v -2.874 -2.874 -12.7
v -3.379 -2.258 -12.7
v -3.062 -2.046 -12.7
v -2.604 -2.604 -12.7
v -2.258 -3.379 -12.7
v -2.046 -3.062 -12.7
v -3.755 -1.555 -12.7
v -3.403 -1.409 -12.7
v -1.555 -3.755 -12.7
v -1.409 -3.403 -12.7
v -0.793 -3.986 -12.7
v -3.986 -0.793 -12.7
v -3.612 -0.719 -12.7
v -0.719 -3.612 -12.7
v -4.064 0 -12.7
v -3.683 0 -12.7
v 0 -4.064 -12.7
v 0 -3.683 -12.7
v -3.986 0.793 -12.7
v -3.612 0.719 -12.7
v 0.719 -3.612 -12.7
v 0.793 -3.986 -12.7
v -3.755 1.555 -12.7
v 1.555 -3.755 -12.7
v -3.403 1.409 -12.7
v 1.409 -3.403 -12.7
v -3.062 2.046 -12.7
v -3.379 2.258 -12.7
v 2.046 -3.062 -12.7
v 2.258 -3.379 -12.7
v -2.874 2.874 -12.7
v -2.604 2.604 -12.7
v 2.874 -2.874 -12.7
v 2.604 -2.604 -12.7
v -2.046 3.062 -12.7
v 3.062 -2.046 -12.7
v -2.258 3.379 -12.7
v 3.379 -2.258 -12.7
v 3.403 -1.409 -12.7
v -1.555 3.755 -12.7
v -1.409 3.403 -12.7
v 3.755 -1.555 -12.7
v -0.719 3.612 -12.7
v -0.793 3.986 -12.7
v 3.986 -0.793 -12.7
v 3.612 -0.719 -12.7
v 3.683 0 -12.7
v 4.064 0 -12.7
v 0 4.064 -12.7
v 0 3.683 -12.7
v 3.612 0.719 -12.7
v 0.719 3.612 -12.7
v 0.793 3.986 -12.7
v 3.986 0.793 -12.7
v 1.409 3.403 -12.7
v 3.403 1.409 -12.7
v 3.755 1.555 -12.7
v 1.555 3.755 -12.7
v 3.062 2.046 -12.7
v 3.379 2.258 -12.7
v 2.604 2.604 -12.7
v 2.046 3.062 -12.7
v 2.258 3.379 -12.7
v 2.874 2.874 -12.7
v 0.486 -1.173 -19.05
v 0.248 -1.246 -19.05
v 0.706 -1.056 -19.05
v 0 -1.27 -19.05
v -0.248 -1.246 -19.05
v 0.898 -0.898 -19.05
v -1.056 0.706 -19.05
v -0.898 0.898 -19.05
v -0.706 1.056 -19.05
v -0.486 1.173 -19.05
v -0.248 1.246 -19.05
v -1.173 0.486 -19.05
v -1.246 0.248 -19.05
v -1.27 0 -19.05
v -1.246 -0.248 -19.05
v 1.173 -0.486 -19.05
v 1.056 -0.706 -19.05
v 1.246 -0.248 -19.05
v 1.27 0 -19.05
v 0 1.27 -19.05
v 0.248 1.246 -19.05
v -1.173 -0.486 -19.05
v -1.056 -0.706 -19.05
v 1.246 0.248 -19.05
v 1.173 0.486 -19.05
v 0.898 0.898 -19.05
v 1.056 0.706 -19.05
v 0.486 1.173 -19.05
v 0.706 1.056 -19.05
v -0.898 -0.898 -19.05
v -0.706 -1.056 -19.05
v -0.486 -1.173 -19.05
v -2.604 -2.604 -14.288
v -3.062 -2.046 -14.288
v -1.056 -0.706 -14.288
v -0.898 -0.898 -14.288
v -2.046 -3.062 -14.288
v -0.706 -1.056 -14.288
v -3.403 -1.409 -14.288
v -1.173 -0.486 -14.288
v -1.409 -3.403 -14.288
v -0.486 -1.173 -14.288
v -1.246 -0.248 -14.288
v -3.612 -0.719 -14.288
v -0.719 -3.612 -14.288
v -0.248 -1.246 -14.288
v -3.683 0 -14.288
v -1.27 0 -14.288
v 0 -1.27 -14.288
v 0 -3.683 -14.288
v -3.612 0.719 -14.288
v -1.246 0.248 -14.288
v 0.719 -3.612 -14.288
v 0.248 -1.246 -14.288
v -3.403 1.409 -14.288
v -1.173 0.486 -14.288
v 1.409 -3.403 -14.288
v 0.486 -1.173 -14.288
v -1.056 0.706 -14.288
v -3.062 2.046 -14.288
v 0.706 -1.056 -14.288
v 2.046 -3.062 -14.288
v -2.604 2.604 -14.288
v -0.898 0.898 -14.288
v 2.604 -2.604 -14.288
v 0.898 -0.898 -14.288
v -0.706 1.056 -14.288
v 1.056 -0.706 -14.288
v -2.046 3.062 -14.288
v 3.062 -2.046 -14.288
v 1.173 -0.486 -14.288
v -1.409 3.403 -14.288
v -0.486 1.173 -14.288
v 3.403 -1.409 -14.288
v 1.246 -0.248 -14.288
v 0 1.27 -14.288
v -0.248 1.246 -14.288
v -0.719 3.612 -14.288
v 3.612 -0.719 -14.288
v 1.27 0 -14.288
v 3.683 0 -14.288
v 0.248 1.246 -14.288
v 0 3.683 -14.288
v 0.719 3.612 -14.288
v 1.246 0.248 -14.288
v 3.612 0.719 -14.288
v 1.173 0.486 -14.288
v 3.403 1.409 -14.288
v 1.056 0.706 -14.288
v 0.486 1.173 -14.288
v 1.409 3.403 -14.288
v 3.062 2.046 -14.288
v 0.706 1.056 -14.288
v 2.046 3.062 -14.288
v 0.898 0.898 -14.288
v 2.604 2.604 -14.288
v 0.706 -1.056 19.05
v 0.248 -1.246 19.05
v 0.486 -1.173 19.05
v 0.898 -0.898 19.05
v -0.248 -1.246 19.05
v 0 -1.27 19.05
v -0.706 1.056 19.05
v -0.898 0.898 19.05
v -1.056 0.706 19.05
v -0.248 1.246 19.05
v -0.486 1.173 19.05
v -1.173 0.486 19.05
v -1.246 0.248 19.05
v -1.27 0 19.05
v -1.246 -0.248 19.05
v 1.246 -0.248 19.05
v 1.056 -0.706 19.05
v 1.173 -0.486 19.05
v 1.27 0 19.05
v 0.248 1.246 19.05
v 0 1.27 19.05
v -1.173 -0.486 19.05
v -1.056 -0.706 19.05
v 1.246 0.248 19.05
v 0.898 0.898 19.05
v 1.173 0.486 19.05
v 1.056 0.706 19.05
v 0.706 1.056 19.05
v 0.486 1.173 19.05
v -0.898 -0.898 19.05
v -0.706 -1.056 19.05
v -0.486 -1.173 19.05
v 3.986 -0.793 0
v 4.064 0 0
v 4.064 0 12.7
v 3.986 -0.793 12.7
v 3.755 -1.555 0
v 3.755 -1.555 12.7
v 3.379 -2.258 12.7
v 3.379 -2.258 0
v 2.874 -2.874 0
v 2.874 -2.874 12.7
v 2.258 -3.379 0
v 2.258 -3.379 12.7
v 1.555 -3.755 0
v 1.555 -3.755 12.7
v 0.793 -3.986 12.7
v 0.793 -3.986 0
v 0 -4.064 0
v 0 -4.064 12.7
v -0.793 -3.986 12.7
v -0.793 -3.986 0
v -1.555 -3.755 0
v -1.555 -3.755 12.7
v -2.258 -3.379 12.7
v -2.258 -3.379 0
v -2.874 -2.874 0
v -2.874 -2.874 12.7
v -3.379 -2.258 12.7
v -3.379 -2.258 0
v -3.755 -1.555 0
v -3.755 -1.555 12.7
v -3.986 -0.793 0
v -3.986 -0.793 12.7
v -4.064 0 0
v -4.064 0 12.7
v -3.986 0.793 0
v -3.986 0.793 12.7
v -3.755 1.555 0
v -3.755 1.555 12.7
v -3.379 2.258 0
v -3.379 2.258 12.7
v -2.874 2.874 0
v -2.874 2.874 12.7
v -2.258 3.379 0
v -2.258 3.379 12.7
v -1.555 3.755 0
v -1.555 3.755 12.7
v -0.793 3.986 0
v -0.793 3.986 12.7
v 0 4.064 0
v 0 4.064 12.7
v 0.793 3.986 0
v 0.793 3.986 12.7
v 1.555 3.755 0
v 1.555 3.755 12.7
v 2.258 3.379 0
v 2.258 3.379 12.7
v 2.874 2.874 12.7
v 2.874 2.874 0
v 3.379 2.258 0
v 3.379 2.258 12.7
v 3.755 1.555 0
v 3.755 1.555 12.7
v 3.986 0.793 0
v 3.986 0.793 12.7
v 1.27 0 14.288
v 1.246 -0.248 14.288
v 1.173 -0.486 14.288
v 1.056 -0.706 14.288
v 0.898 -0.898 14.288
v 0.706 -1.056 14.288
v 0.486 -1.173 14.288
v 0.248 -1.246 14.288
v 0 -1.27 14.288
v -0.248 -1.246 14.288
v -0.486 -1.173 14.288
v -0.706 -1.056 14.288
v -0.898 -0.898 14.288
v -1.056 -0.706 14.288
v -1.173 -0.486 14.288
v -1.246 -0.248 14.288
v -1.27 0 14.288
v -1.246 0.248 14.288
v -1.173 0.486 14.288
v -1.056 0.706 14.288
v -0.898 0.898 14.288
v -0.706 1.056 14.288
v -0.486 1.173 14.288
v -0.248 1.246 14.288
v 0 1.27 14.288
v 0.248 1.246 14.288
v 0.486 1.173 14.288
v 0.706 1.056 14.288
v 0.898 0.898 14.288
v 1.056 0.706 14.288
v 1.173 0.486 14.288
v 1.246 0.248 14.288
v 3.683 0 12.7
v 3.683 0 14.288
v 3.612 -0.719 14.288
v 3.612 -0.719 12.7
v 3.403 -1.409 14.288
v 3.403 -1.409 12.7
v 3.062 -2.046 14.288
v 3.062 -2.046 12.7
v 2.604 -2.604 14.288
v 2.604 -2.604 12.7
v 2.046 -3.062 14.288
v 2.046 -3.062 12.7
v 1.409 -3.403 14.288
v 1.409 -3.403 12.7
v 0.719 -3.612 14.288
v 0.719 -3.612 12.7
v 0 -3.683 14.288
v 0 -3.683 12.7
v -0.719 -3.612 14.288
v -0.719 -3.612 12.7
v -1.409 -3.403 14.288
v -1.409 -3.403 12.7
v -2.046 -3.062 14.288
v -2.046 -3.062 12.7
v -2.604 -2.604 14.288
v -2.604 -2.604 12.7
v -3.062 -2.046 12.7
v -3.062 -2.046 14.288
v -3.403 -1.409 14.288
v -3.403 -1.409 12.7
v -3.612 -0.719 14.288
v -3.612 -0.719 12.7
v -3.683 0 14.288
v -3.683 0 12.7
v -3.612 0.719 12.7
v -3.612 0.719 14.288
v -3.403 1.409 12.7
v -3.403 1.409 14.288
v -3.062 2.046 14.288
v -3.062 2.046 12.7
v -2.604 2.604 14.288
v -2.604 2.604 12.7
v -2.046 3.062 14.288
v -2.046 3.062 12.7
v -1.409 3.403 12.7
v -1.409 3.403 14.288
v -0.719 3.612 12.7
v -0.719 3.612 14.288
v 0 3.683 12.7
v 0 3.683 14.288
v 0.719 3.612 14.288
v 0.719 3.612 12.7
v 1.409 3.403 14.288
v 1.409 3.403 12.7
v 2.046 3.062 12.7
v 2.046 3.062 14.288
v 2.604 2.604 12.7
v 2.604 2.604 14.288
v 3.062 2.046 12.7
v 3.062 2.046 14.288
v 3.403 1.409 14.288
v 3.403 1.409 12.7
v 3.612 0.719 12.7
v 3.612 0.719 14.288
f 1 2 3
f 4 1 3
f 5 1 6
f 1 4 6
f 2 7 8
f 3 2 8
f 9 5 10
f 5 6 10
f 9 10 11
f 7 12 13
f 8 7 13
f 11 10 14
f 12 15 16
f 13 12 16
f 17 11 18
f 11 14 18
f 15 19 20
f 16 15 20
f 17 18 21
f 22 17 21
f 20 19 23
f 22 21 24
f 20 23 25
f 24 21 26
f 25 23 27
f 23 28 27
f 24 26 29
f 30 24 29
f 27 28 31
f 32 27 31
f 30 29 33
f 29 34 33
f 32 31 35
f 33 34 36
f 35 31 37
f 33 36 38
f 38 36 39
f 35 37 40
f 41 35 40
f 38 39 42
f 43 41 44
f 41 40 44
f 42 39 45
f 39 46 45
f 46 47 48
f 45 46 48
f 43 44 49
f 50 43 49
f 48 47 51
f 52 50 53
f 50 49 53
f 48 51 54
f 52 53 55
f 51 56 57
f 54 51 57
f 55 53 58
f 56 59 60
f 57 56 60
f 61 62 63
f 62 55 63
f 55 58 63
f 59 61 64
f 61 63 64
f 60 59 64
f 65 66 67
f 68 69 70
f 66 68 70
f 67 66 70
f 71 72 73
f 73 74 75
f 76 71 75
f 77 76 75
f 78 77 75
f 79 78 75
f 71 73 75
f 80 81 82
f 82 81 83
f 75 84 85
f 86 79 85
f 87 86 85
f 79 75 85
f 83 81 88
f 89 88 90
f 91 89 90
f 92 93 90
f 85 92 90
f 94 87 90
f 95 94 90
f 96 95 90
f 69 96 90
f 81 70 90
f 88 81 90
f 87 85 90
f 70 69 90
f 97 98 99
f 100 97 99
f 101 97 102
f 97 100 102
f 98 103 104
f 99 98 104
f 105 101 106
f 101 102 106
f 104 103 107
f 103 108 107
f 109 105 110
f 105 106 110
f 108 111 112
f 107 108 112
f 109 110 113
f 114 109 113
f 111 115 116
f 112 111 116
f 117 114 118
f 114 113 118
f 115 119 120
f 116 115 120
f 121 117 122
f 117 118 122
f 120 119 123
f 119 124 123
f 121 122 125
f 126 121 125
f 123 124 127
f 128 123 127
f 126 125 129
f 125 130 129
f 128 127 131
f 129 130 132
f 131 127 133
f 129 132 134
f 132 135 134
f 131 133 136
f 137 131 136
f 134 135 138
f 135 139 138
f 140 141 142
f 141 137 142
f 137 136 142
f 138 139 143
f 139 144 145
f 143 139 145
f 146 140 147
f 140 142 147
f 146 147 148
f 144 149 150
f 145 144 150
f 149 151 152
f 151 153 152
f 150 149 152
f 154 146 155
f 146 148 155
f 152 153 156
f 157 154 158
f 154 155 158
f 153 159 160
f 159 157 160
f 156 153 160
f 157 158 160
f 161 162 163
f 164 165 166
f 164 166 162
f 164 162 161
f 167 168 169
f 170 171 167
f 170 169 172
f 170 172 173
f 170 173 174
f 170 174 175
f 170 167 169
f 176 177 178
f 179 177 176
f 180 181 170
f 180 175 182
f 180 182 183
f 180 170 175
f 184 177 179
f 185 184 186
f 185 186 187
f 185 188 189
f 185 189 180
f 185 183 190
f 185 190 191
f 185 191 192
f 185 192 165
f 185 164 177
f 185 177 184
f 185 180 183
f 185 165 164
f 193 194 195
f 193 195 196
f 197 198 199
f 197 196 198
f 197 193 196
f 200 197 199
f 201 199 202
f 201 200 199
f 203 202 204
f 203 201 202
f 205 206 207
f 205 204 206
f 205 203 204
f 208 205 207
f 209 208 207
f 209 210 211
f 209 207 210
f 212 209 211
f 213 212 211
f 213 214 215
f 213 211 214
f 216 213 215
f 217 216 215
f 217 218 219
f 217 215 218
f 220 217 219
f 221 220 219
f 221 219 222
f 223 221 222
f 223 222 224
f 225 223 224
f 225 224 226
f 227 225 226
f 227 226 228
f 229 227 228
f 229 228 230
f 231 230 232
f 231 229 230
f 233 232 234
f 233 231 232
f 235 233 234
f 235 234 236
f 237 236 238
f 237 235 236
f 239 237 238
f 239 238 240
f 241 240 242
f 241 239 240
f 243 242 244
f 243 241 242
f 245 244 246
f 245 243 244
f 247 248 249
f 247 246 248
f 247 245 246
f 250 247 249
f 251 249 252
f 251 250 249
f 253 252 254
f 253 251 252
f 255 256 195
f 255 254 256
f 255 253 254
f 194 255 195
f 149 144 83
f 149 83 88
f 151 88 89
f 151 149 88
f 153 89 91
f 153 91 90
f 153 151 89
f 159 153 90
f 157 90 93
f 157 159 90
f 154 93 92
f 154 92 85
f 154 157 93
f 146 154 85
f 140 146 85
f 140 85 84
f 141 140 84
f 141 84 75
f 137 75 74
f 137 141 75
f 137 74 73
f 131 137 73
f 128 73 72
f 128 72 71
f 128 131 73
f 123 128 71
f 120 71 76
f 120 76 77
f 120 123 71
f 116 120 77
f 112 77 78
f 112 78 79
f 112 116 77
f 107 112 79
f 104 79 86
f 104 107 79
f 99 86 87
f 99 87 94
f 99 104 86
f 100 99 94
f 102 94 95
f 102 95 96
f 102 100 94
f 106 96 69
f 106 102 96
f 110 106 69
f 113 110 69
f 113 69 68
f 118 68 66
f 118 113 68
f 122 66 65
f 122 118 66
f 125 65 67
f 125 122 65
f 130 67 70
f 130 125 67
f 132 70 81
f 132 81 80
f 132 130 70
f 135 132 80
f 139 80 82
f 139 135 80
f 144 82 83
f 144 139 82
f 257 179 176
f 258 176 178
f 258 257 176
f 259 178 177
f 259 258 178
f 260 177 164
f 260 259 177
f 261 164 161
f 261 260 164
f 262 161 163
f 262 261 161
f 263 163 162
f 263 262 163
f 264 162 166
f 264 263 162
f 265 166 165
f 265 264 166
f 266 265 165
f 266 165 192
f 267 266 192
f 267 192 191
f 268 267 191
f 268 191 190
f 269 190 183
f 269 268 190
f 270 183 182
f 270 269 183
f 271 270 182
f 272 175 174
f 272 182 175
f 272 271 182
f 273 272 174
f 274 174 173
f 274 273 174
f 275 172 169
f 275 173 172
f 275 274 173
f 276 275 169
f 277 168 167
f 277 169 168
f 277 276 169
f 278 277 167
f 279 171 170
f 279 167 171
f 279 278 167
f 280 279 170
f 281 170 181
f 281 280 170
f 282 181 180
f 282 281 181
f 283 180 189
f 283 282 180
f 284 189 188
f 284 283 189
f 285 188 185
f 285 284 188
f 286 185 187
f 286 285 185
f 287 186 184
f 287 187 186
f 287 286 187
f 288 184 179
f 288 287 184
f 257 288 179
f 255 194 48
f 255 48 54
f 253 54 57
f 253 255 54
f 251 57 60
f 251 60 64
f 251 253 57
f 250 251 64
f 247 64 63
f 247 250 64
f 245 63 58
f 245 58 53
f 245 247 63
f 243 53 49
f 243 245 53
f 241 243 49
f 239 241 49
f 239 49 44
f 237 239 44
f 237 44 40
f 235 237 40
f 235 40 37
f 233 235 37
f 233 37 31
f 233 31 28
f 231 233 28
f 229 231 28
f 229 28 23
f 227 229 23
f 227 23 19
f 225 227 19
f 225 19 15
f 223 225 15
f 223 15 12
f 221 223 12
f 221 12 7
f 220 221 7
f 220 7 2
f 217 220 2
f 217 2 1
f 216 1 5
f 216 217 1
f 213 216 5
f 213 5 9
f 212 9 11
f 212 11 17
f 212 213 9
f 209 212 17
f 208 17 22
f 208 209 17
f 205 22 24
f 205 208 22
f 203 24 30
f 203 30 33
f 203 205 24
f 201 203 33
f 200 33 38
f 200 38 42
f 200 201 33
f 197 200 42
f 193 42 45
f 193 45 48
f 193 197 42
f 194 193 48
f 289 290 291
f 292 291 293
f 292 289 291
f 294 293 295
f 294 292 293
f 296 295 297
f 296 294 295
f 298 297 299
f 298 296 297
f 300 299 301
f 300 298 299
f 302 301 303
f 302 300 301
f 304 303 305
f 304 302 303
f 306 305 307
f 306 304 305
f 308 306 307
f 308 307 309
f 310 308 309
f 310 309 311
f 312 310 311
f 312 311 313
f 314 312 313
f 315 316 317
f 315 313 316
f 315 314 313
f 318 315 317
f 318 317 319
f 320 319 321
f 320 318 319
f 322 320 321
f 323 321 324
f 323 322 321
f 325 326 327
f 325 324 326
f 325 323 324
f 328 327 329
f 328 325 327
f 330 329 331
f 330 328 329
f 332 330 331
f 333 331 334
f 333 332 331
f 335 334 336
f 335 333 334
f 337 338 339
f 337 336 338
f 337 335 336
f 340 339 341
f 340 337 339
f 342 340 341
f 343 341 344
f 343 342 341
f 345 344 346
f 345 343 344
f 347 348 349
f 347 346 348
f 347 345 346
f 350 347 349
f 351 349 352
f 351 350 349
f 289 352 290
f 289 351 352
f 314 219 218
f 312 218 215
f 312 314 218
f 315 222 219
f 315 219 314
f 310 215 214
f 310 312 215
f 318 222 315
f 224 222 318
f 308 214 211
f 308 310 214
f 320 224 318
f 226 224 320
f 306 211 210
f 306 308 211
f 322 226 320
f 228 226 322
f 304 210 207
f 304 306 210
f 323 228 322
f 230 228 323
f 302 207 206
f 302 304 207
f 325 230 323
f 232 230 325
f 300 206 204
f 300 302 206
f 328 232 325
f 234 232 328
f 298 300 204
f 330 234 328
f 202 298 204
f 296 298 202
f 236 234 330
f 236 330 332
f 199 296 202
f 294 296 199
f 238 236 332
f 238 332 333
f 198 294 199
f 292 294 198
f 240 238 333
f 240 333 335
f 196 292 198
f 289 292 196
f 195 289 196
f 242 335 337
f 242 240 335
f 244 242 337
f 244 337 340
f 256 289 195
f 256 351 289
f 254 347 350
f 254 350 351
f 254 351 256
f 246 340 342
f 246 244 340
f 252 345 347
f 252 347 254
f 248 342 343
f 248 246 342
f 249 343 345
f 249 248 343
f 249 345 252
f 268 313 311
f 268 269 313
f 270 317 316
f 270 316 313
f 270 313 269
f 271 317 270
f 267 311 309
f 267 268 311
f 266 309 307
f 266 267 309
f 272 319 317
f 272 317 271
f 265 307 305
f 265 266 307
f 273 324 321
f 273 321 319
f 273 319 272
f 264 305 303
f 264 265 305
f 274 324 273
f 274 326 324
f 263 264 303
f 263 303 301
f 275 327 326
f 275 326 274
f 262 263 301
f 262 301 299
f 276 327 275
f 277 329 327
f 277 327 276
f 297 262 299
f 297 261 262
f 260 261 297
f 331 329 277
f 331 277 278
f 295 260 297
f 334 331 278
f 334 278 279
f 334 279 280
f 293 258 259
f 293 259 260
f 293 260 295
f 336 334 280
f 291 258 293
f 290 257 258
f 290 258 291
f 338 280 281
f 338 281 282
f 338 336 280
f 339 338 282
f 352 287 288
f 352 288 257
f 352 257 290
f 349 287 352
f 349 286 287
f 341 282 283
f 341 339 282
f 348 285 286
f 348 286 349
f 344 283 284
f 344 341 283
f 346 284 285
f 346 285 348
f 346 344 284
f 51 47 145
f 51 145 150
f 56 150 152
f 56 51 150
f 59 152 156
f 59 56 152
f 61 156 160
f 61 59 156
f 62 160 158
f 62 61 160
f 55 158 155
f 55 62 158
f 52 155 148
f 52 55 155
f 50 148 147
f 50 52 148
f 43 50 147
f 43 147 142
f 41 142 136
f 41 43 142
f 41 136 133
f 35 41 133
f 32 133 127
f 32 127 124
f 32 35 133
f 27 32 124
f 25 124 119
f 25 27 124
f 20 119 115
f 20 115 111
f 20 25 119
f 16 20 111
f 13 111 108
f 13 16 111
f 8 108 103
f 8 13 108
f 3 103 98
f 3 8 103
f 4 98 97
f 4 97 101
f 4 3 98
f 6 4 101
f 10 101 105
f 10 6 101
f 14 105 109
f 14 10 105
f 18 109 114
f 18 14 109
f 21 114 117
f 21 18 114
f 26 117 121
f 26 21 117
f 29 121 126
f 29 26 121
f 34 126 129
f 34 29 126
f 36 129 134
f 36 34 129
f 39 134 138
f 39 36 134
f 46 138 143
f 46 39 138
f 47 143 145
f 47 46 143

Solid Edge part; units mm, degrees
sketch "Sketch1" plane through (0, 0, 0) normal (0, 0, 1) x (1, 0, 0)
  circle A0 centre (0, 0) radius 1.27
extrude "Protrusion1" add sketch "Sketch1" along normal mid plane 38.1
sketch "Sketch2" plane through (0, 0, 0) normal (0, 0, 1) x (1, 0, 0)
  circle A0 centre (0, 0) radius 3.683
extrude "ExtrudedProtrusion_2" add sketch "Sketch2" along normal mid plane 28.575
sketch "Sketch3" plane through (0, 0, 0) normal (0, 0, 1) x (1, 0, 0)
  circle A0 centre (0, 0) radius 4.064
extrude "ExtrudedProtrusion_3" add sketch "Sketch3" along normal mid plane 25.4
